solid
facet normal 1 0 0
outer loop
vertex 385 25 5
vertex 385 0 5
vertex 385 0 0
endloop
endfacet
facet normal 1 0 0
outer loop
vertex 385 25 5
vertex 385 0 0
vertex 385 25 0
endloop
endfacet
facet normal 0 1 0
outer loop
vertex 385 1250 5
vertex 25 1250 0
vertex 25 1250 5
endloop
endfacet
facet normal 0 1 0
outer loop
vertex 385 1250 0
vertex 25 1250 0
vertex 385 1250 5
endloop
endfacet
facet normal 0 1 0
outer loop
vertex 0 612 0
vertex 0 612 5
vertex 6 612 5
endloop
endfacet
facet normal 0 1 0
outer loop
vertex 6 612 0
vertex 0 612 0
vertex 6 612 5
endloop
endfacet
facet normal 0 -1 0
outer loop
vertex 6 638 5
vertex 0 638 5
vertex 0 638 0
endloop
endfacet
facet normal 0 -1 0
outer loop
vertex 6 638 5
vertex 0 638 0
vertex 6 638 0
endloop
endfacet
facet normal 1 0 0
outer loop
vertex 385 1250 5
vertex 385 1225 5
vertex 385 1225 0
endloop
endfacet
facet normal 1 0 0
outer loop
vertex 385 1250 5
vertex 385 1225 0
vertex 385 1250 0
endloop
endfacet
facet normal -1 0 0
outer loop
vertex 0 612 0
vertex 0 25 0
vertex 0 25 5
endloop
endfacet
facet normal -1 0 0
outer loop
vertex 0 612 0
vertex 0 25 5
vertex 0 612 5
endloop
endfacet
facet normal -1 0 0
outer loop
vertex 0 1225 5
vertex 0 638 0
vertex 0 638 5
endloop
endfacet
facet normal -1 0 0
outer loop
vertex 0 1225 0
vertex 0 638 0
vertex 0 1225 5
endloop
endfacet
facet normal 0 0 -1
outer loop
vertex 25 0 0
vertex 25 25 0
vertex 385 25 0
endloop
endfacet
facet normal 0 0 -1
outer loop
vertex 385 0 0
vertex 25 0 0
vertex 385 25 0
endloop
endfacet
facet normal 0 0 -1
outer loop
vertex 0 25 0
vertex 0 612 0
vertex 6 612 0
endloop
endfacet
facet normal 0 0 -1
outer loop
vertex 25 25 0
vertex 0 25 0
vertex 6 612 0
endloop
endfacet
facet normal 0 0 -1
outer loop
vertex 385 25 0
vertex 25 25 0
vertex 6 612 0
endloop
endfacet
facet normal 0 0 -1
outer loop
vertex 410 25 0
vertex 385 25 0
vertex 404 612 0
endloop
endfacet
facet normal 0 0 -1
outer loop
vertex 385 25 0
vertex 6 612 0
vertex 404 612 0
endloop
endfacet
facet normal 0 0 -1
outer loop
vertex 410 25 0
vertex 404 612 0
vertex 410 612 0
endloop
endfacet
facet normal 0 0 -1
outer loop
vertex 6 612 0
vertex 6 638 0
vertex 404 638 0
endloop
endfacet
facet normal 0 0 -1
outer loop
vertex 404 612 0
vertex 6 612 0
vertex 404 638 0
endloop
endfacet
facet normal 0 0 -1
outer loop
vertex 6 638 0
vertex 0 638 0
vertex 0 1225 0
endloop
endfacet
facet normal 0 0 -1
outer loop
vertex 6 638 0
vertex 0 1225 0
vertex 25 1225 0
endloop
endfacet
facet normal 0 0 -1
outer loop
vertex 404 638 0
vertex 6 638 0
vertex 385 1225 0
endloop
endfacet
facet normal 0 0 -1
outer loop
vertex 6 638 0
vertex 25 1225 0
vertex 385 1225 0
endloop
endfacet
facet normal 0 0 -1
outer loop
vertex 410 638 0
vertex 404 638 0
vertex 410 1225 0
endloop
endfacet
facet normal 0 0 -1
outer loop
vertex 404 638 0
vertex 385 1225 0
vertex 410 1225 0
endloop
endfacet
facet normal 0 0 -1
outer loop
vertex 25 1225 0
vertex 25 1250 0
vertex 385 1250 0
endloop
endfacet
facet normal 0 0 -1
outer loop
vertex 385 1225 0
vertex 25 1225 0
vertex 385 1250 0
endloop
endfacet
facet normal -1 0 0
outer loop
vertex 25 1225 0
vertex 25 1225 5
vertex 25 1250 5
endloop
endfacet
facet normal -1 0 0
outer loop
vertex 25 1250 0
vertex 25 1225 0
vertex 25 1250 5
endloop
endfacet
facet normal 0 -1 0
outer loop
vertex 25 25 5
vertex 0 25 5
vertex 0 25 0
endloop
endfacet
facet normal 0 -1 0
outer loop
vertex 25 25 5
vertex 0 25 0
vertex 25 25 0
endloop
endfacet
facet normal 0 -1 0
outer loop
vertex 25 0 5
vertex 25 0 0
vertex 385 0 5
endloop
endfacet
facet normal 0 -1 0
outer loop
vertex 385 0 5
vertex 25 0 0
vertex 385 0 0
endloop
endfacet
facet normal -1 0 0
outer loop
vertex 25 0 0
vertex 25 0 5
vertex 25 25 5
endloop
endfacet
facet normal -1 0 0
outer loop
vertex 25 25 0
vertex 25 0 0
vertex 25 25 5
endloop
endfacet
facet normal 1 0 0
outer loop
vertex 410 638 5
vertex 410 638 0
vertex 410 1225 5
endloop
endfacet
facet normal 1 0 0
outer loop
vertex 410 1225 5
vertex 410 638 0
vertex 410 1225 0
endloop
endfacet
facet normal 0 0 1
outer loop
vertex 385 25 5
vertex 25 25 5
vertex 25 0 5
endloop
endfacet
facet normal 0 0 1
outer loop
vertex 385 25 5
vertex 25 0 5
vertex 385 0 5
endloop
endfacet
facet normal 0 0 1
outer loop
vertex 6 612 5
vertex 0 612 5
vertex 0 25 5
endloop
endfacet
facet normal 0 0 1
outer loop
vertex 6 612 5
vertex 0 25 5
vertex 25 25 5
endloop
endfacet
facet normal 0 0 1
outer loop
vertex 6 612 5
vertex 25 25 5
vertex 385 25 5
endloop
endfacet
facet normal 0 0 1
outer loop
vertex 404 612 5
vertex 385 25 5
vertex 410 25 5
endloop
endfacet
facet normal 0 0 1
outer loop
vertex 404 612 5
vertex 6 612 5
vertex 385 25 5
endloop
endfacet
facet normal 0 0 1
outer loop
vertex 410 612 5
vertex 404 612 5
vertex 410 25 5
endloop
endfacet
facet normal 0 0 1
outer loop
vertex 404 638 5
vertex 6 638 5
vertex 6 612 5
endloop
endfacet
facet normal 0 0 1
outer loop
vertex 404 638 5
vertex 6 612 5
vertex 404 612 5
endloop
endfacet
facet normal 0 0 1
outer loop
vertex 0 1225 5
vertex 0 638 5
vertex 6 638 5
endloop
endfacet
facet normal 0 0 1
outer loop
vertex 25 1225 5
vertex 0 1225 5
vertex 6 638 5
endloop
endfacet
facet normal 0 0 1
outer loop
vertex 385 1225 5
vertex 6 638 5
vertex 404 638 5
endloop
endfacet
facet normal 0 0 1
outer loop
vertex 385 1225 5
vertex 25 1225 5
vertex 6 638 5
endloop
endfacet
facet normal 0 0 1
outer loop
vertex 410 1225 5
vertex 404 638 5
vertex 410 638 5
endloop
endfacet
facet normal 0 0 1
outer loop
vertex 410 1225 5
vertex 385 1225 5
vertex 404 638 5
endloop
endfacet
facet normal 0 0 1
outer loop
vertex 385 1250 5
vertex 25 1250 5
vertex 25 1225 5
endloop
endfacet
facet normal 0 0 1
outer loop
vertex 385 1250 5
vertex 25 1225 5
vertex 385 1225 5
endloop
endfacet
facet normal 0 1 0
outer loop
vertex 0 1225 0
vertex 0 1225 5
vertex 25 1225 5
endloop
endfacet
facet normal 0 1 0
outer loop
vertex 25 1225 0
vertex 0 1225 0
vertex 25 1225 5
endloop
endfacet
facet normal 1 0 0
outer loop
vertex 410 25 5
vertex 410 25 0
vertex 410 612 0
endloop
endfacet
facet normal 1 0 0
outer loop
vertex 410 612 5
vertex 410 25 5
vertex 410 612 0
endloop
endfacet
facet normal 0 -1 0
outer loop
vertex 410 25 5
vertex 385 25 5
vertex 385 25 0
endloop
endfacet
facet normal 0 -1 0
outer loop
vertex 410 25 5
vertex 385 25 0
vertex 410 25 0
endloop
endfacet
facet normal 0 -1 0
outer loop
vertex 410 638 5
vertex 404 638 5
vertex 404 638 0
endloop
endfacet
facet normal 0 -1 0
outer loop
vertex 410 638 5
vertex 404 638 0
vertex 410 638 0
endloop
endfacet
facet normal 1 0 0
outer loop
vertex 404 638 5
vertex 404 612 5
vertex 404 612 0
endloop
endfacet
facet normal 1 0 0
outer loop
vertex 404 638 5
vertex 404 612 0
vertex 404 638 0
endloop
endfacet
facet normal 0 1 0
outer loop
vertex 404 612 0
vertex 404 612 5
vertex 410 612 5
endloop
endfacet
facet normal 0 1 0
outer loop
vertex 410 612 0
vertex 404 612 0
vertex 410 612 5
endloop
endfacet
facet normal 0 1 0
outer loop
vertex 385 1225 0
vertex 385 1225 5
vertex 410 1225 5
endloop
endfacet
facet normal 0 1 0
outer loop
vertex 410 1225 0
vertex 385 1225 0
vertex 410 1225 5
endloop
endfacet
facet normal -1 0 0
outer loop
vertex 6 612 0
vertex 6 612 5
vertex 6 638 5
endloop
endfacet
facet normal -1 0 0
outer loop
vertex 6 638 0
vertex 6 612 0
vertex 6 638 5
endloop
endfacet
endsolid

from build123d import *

# Parameters (mm, degrees)
F0_W      = 410
F0_H      = 1250
F1_DEPTH  = 5
F2_W      = 25
F2_H      = 25
F3_DEPTH  = 25
F4_W      = 25
F4_H      = 25
F5_DEPTH  = 25
F6_W      = 25
F6_H      = 25
F7_DEPTH  = 25
F8_W      = 25
F8_H      = 25
F9_DEPTH  = 25
F10_W     = 12
F10_H     = 26
F11_DEPTH = 25
F12_W     = 12
F12_H     = 26
F13_DEPTH = 25


with BuildPart() as f1:
    # F0 (on Top) → F1 (new body)
    with BuildSketch(Plane.XY):
        with Locations((205, 625)):
            Rectangle(F0_W, F0_H)
    extrude(amount=F1_DEPTH)

    # F2 (on face) → F3 (cut)
    with BuildSketch(Plane.XY.offset(5)):
        with Locations((12.5, 12.5)):
            Rectangle(F2_W, F2_H)
    extrude(amount=-F3_DEPTH, mode=Mode.SUBTRACT)

    # F4 (on face) → F5 (cut)
    with BuildSketch(Plane.XY.offset(5)):
        with Locations((397.5, 12.5)):
            Rectangle(F4_W, F4_H)
    extrude(amount=-F5_DEPTH, mode=Mode.SUBTRACT)

    # F6 (on face) → F7 (cut)
    with BuildSketch(Plane.XY.offset(5)):
        with Locations((397.5, 1237.5)):
            Rectangle(F6_W, F6_H)
    extrude(amount=-F7_DEPTH, mode=Mode.SUBTRACT)

    # F8 (on face) → F9 (cut)
    with BuildSketch(Plane.XY.offset(5)):
        with Locations((12.5, 1237.5)):
            Rectangle(F8_W, F8_H)
    extrude(amount=-F9_DEPTH, mode=Mode.SUBTRACT)

    # F10 (on face) → F11 (cut)
    with BuildSketch(Plane.XY.offset(5)):
        with Locations((0, 625)):
            Rectangle(F10_W, F10_H)
    extrude(amount=-F11_DEPTH, mode=Mode.SUBTRACT)

    # F12 (on face) → F13 (cut)
    with BuildSketch(Plane.XY.offset(5)):
        with Locations((410, 625)):
            Rectangle(F12_W, F12_H)
    extrude(amount=-F13_DEPTH, mode=Mode.SUBTRACT)


solid = f1.part
